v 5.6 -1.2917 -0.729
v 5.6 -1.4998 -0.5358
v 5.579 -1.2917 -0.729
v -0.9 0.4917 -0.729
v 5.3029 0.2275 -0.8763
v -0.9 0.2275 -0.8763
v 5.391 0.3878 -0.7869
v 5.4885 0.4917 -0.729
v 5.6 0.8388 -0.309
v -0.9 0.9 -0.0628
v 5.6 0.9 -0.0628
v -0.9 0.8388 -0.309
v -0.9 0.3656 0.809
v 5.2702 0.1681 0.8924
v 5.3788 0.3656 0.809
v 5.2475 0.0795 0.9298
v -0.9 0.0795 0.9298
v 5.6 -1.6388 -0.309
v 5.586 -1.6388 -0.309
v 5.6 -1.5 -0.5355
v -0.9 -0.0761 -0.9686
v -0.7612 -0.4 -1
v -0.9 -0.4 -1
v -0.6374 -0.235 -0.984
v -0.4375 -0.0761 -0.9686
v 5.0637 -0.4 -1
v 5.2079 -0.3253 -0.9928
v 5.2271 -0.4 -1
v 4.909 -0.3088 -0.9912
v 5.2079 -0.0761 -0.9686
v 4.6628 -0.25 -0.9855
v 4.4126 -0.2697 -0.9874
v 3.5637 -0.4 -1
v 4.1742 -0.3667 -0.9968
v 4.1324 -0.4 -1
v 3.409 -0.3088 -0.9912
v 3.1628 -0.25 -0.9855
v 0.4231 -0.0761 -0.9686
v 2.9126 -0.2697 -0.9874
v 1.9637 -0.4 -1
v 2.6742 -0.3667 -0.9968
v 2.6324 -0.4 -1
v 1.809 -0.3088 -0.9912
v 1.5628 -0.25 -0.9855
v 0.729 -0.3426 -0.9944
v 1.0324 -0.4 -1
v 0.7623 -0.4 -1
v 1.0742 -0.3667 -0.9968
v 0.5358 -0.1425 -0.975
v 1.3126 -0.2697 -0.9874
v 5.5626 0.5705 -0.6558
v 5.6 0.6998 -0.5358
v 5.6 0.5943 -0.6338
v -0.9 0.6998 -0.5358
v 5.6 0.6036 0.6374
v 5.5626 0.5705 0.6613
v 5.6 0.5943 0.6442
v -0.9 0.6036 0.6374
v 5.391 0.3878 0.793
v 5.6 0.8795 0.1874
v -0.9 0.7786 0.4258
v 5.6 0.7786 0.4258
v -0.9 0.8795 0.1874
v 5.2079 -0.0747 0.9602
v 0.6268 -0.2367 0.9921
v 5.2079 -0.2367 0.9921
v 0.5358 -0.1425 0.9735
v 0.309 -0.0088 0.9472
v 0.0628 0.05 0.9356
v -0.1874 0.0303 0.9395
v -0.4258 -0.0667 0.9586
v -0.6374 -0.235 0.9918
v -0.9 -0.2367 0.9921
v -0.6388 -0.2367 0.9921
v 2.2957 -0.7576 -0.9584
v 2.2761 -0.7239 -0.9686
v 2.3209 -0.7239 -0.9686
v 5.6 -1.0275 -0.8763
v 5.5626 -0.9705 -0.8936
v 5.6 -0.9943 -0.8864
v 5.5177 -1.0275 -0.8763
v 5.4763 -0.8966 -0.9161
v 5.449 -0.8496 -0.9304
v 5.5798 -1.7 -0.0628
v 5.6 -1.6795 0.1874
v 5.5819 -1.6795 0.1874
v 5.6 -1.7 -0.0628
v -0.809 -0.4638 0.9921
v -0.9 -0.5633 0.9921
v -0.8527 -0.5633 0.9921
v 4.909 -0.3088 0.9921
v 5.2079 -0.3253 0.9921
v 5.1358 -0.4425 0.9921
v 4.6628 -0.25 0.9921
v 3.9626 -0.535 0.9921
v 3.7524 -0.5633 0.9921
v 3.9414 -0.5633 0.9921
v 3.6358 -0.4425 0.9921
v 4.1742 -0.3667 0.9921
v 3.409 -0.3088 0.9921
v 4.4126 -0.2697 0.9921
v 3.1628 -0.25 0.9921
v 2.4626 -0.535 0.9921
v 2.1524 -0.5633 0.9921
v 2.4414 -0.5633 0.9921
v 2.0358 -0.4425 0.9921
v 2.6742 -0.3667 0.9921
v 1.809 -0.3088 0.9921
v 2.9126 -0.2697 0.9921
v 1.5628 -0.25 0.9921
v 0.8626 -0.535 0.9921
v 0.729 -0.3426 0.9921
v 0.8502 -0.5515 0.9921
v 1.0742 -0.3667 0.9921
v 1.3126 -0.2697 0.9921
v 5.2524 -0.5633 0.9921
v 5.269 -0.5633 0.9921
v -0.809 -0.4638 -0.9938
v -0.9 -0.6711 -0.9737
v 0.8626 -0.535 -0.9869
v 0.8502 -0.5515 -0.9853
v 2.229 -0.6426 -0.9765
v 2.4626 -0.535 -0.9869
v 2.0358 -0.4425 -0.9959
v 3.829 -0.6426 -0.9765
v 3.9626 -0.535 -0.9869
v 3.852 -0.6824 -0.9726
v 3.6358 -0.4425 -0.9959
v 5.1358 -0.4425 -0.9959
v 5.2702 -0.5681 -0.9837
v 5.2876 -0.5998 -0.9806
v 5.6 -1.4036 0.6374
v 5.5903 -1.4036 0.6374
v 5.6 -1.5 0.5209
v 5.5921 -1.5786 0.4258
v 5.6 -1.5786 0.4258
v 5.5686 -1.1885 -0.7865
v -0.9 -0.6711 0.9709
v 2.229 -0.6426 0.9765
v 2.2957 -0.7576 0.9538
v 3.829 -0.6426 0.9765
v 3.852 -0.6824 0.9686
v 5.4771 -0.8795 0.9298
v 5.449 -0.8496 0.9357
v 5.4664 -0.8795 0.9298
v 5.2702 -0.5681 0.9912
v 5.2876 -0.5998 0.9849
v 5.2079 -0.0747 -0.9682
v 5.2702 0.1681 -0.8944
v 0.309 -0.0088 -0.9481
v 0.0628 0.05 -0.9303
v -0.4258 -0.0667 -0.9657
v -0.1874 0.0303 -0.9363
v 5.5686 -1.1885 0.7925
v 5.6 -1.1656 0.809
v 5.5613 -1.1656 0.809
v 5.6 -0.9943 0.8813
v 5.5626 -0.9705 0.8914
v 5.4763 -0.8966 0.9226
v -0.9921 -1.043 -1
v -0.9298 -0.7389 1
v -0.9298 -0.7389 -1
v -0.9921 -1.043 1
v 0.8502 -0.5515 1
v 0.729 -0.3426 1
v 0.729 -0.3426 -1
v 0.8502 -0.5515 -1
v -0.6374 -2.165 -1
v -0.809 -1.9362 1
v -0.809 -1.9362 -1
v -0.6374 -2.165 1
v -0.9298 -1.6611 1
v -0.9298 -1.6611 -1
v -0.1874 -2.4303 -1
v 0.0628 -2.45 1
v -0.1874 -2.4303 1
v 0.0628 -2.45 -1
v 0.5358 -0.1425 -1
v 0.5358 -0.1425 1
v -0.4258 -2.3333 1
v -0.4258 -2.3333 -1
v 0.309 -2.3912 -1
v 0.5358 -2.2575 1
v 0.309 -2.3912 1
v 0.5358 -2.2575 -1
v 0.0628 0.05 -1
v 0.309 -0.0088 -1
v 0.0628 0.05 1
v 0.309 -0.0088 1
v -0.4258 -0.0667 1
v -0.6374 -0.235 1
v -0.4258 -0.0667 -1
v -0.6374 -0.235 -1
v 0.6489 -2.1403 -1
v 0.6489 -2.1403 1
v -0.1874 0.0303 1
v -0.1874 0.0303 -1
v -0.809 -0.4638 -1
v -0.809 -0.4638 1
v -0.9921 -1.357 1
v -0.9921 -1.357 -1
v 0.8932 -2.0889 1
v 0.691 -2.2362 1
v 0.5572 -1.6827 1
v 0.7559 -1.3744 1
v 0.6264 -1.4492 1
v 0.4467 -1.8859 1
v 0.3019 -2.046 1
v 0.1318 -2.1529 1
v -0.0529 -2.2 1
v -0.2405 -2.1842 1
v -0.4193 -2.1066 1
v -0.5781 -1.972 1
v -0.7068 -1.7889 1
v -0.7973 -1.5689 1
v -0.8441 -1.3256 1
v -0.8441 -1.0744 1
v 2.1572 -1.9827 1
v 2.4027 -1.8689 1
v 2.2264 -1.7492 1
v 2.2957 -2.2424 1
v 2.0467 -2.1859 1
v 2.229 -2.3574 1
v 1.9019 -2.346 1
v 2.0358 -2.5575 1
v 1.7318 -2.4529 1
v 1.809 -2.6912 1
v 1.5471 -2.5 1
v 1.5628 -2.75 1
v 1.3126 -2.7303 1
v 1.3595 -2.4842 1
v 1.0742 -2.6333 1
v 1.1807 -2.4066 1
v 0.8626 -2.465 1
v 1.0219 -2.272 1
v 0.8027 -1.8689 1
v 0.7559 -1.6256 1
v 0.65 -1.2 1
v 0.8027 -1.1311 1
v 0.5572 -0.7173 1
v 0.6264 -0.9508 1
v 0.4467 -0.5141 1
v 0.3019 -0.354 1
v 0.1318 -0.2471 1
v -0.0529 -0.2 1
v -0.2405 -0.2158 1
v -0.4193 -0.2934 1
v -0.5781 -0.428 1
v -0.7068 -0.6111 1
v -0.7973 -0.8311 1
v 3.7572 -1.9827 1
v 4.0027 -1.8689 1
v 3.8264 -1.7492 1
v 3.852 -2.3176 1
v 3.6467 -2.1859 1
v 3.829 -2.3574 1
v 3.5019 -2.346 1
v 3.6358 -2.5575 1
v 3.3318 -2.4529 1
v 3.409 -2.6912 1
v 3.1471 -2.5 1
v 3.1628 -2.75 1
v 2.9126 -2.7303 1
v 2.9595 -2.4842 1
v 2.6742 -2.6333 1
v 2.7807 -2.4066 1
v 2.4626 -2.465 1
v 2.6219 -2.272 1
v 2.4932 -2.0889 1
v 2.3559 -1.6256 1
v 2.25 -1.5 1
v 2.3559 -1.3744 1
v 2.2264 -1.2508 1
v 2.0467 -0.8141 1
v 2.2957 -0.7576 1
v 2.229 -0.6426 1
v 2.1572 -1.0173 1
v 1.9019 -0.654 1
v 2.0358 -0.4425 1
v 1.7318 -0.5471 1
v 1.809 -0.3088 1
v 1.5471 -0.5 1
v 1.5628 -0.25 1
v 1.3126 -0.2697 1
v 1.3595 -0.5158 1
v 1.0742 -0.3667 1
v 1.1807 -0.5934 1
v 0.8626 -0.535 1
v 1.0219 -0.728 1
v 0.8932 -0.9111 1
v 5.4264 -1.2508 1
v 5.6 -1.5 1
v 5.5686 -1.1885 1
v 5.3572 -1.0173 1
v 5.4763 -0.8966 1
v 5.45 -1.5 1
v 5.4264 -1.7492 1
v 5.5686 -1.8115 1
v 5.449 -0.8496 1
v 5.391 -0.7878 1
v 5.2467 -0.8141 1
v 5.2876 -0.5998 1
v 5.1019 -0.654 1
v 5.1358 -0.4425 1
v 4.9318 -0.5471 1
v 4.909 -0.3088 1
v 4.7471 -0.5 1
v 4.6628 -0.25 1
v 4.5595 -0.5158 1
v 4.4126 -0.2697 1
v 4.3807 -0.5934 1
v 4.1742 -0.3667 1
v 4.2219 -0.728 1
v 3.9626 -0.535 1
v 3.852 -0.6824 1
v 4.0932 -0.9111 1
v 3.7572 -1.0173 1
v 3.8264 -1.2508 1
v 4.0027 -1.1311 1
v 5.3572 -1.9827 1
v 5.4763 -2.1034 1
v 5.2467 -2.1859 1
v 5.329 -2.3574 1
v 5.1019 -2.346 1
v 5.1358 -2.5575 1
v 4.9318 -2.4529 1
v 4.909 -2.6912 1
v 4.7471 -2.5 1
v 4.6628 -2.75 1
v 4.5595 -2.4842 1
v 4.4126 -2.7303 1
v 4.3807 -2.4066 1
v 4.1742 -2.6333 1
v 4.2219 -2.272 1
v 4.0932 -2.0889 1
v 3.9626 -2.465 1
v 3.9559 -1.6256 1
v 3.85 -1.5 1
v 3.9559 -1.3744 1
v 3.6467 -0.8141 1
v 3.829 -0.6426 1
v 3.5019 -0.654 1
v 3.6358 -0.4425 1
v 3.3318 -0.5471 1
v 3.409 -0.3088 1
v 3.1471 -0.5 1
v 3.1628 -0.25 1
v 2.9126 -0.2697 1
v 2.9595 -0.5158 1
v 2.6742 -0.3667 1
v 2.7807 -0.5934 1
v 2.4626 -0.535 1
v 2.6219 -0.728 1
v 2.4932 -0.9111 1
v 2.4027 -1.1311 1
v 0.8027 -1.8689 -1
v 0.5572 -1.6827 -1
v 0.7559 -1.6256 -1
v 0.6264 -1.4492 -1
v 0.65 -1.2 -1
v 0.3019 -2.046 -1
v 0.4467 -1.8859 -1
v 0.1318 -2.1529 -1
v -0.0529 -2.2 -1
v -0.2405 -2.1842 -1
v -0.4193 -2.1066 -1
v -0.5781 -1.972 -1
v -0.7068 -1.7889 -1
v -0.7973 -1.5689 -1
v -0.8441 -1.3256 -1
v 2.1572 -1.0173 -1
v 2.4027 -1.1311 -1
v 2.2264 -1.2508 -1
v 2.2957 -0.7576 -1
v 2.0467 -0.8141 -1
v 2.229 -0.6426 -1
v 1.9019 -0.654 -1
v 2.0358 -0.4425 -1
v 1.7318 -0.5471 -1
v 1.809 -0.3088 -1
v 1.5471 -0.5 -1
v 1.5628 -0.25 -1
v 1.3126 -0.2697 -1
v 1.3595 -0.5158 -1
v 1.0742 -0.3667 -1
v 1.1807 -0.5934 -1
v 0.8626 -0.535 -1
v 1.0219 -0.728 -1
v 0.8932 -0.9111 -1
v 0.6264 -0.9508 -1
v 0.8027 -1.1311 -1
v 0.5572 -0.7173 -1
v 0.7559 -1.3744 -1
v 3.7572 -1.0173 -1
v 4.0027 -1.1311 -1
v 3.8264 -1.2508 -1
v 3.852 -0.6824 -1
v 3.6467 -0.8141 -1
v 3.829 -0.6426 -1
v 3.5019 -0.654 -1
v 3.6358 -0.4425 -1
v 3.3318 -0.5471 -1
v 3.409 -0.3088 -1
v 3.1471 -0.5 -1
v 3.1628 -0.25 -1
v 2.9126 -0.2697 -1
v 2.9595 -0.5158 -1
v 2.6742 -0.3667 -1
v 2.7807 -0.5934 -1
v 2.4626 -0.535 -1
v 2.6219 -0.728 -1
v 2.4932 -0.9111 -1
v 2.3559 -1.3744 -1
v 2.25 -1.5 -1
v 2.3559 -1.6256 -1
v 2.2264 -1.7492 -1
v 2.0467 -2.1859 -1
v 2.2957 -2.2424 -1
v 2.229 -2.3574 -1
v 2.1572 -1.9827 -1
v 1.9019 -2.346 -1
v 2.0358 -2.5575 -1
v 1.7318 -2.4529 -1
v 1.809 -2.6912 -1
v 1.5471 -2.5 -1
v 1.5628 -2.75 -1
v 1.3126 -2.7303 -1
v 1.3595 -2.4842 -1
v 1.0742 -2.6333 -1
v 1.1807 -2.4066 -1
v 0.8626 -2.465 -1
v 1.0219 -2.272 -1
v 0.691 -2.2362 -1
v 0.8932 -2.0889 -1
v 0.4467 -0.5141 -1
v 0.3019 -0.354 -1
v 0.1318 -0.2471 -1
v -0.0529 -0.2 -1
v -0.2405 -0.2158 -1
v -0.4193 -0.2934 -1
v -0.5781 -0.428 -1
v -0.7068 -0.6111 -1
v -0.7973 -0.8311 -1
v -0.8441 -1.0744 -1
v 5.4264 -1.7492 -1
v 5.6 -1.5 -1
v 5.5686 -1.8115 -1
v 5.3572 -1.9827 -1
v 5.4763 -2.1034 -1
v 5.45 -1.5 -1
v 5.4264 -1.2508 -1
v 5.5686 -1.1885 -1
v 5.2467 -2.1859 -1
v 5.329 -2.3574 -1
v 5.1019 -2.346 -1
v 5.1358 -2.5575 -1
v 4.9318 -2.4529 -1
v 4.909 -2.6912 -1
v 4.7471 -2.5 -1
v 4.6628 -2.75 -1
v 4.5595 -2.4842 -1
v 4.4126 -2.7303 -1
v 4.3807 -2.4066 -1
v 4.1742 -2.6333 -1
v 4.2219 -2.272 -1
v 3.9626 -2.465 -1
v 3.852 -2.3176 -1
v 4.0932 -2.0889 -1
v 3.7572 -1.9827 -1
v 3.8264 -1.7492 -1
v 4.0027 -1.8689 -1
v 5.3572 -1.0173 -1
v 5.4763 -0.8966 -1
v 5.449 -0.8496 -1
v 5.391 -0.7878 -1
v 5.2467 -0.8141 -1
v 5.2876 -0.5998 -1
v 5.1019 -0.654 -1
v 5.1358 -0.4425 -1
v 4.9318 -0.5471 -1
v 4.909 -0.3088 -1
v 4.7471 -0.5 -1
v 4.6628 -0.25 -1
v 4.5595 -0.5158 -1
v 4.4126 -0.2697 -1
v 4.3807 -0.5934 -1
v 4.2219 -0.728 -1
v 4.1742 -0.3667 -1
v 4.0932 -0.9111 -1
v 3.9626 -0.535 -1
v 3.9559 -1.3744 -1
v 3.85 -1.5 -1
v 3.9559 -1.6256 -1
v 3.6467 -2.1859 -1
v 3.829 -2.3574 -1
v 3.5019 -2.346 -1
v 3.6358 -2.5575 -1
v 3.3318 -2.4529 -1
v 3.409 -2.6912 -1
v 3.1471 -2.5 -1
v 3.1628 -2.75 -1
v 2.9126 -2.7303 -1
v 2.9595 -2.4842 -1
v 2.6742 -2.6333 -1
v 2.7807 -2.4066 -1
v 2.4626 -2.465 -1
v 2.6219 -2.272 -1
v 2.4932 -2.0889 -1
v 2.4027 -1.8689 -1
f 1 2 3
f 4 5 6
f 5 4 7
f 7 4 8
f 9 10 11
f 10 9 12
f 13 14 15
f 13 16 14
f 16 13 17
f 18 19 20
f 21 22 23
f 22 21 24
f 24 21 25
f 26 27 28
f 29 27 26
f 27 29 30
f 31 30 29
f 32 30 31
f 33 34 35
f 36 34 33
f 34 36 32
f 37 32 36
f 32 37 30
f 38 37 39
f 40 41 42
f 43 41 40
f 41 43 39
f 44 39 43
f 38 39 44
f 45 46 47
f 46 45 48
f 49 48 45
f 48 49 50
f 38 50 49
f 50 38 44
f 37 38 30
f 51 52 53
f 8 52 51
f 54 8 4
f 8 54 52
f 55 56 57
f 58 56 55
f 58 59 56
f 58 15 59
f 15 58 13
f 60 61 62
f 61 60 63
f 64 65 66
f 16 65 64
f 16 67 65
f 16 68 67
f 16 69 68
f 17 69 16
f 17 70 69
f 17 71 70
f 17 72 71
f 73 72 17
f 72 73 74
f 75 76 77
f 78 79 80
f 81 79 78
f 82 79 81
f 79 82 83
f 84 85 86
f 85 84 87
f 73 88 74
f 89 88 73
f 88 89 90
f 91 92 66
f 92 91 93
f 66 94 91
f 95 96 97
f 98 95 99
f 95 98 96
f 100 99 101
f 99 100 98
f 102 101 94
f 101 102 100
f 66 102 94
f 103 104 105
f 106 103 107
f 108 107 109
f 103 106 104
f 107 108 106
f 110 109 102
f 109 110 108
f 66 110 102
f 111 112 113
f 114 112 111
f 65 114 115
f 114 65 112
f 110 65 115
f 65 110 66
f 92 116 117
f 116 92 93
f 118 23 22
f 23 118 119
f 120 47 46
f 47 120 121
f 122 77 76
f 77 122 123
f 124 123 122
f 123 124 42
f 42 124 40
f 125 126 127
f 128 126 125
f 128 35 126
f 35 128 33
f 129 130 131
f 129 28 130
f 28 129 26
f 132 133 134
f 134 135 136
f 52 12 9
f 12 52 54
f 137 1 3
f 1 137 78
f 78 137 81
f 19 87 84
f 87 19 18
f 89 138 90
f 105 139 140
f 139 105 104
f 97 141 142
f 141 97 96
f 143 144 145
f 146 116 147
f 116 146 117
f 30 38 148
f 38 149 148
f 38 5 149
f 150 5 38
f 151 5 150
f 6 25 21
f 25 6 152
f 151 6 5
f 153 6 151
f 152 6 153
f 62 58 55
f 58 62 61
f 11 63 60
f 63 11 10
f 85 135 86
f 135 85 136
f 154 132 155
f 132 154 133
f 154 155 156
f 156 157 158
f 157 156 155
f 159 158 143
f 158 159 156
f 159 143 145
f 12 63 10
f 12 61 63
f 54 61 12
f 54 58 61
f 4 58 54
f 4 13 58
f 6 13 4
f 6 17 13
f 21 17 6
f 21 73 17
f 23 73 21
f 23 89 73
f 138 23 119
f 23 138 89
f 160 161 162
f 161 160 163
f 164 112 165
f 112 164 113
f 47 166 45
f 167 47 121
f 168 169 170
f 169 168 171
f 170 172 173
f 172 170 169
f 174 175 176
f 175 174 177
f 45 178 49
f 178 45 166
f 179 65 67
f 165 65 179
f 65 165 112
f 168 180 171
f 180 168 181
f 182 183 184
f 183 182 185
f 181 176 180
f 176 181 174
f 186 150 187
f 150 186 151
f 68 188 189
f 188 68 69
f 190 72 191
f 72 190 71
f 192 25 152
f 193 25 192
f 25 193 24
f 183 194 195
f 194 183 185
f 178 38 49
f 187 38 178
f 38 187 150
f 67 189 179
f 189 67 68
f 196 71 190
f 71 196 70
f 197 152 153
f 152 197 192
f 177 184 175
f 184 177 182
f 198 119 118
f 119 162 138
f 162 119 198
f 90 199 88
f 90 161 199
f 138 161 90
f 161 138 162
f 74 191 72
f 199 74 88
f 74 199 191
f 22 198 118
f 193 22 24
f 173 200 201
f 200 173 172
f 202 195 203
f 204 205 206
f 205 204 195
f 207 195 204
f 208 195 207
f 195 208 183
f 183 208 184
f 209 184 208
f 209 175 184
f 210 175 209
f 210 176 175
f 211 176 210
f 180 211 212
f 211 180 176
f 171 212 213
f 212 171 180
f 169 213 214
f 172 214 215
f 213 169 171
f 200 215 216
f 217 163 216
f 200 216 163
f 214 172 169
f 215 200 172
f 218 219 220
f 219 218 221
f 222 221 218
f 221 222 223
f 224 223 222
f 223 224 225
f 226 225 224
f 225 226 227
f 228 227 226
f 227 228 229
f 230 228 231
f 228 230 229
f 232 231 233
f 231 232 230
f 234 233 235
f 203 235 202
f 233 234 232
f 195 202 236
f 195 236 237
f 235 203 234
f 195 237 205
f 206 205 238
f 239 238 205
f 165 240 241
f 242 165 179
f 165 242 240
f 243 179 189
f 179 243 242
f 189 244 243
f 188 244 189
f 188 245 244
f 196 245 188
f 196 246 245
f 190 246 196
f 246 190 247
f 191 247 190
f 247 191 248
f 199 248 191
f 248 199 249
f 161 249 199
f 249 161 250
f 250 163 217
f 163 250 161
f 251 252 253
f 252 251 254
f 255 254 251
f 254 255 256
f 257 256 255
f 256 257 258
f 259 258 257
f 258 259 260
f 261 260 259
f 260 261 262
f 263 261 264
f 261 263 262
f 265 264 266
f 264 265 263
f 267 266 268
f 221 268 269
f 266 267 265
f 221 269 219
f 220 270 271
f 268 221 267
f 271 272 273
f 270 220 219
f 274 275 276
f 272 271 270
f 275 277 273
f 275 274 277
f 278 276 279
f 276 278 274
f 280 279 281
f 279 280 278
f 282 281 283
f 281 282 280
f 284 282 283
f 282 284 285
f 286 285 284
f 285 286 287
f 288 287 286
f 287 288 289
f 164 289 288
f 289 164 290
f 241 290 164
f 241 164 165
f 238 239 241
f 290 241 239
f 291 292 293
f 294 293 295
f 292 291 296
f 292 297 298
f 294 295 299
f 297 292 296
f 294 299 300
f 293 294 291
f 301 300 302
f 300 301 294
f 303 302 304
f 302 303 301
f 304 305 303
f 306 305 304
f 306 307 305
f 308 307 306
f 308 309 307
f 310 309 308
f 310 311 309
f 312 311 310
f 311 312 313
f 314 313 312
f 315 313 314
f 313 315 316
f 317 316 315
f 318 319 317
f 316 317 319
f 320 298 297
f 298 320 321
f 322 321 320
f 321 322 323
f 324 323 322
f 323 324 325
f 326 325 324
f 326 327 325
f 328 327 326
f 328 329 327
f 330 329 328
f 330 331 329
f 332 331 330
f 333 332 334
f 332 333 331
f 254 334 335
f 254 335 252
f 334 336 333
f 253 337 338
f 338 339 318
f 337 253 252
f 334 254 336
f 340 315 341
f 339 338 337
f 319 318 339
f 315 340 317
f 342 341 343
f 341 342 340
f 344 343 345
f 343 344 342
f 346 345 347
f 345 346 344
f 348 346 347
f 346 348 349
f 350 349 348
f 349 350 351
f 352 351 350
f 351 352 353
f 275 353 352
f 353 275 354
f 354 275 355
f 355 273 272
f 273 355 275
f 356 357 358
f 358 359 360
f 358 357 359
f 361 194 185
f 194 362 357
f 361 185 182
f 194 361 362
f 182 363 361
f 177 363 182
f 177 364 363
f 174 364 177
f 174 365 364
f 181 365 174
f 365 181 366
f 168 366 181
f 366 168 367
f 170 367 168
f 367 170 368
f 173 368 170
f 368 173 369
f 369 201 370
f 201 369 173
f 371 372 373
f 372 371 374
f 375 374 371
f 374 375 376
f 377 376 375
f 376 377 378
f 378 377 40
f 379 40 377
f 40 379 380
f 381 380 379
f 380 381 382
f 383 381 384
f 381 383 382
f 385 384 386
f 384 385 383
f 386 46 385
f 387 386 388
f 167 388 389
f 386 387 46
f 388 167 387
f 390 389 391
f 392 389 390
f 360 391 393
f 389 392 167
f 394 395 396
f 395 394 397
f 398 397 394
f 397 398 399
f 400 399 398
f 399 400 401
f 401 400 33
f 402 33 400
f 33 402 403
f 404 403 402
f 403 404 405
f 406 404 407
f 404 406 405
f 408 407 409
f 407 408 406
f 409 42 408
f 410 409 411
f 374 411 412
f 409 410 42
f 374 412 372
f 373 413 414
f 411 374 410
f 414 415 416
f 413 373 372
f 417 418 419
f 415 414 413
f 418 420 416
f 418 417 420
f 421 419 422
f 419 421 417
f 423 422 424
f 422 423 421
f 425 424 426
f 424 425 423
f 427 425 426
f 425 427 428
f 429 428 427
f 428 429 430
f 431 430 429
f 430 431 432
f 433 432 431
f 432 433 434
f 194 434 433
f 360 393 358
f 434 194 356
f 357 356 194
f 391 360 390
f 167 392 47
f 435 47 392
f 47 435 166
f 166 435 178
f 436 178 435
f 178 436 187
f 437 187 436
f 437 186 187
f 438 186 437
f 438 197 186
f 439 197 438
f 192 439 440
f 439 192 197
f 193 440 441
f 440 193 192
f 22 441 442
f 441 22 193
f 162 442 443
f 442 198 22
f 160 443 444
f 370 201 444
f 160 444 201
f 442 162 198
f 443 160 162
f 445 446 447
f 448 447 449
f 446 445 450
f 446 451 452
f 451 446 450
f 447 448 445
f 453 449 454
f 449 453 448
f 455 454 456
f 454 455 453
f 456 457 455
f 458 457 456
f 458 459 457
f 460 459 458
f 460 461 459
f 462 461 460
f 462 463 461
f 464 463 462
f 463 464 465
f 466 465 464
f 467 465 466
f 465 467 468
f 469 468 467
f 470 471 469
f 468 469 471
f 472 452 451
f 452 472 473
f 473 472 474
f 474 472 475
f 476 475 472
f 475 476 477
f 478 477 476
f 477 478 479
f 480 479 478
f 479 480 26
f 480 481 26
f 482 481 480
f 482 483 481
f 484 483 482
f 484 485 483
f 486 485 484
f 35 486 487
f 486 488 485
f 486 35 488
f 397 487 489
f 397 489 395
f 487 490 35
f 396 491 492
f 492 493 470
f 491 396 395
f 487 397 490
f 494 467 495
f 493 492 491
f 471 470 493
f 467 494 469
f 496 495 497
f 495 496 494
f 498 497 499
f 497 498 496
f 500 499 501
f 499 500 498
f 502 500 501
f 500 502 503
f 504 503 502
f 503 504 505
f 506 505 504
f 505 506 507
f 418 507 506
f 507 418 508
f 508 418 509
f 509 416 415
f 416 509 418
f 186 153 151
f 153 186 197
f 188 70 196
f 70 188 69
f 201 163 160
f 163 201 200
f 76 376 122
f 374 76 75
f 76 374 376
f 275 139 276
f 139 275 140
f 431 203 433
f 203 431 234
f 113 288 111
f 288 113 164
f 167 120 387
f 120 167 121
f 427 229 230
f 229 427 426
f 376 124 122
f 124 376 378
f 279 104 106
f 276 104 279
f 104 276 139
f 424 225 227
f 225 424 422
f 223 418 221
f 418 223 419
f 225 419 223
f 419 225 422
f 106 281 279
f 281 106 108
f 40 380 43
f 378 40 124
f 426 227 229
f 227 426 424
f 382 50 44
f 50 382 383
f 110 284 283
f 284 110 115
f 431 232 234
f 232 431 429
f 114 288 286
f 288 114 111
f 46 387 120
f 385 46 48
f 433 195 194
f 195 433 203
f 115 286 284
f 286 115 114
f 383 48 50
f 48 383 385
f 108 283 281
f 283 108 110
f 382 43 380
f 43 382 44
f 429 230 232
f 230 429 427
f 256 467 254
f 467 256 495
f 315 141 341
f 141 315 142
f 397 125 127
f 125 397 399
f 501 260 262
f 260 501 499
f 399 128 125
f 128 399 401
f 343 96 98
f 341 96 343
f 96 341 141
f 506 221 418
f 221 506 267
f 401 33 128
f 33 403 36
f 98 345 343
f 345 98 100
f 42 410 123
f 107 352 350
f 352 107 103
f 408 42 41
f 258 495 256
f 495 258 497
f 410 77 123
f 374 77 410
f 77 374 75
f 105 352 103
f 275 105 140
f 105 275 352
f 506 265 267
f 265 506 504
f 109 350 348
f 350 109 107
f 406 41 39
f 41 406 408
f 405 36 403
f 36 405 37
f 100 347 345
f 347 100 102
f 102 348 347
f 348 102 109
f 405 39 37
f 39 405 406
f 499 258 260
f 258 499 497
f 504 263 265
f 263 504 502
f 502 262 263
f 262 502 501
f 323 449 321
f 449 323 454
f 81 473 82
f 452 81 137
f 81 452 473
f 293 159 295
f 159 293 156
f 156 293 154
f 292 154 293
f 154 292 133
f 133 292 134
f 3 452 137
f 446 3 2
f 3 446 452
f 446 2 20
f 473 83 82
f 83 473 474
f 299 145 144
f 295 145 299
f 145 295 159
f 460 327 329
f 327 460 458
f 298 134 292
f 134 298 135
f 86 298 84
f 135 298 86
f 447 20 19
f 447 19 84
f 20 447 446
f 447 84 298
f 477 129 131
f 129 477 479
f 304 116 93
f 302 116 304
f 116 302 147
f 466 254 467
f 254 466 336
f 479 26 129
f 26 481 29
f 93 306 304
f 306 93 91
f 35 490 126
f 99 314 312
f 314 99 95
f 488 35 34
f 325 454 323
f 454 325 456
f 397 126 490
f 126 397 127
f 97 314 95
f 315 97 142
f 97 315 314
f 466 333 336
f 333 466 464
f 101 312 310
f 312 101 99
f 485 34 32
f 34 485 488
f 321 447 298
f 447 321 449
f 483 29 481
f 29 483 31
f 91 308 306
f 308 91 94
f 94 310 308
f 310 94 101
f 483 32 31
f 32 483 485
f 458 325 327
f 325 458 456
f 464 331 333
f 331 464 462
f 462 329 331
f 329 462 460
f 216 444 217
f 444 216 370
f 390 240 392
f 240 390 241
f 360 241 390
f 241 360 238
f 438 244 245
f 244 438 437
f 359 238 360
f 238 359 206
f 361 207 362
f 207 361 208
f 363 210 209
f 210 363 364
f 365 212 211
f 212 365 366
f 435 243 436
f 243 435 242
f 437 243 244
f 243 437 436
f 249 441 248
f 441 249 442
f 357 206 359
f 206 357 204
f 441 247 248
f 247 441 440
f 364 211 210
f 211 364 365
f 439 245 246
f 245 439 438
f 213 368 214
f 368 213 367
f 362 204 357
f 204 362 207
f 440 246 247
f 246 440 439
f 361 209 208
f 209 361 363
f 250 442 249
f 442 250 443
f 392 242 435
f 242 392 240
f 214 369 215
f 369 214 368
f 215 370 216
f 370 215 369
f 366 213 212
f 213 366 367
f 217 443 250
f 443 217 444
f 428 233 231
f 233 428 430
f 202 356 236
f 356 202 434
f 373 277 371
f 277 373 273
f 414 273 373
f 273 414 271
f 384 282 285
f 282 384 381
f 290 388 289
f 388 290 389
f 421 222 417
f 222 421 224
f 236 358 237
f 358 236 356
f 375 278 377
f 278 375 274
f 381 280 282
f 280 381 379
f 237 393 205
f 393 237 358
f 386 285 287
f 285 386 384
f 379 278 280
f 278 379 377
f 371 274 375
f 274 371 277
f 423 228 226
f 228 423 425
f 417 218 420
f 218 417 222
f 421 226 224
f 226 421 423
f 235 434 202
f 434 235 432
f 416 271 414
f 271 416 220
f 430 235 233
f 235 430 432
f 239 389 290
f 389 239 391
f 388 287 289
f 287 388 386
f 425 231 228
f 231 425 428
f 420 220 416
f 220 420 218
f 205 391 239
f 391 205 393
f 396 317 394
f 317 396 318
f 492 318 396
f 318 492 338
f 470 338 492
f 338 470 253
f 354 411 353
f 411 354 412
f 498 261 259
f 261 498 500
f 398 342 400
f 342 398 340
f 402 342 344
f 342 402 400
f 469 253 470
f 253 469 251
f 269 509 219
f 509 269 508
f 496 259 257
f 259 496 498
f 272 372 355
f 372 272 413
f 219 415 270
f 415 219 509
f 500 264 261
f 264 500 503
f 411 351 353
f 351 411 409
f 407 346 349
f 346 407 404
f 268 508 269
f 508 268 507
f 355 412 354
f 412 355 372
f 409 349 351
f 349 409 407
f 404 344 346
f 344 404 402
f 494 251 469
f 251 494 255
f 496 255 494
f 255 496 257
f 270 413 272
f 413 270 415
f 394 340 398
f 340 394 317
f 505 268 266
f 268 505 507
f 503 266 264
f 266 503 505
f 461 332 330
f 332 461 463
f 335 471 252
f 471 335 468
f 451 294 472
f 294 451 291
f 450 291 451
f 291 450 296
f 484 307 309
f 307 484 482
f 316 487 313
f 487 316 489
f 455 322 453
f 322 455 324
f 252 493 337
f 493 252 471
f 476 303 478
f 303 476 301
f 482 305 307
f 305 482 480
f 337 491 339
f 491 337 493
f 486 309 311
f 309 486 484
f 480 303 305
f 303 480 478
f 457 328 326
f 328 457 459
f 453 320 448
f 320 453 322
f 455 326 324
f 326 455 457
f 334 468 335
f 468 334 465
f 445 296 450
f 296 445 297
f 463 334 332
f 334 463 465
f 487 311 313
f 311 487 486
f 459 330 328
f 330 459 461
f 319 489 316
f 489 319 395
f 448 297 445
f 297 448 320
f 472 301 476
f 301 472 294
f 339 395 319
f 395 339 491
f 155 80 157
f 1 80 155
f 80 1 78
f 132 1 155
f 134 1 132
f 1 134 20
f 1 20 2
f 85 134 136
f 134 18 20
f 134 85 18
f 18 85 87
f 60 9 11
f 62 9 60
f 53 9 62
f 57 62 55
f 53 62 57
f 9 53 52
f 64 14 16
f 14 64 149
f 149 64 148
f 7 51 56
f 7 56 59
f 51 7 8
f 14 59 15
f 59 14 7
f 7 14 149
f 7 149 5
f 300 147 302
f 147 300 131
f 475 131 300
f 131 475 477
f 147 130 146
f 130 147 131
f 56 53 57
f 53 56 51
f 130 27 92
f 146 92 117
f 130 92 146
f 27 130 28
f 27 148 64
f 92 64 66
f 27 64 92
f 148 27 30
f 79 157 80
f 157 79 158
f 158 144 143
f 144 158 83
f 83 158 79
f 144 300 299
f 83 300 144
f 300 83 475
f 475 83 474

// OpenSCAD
difference(){
    union(){
        // spine of handle
        translate([-0.9,-0.4,0]){
            resize([0,2.6,0]){
                rotate([0,90,0]){
                    cylinder(r=1,h=7,$fn=25);
                }
            }
        }
        
        // finger guard shell
        translate([0,-1.2,-1]){
            resize([0,2.5,0]){
                difference(){
                    cylinder(r=1,h=2,$fn=25);
                }
            }
        }
        translate([1.5,-1.5,-1]){
            resize([0,2.5,0]){
                difference(){
                    cylinder(r=1,h=2,$fn=25);
                }
            }
        }
        translate([3.1,-1.5,-1]){
            resize([0,2.5,0]){
                difference(){
                    cylinder(r=1,h=2,$fn=25);
                }
            }
        }
        translate([4.6,-1.5,-1]){
            resize([0,2.5,0]){
                difference(){
                    cylinder(r=1,h=2,$fn=25);
                }
            }
        }
    }
    
    // finger guard holes
    translate([-0.1,-1.2,-2]){
        resize([0,2,0]){
            cylinder(r=.75,h=4,$fn=25);
        }
    }
    translate([1.5,-1.5,-2]){
        resize([0,2,0]){
            cylinder(r=.75,h=4,$fn=25);
        }
    }
    translate([3.1,-1.5,-2]){
        resize([0,2,0]){
            cylinder(r=.75,h=4,$fn=25);
        }
    }
    translate([4.7,-1.5,-2]){
        resize([0,2,0]){
        cylinder(r=.75,h=4,$fn=25);
        }
    }
    
    // blade cut-out
    translate([5.6,-3,-2]){
        #cube([5,4,4]);
    }
    translate([6.2,-0.2,-2]){
        cylinder(r=1,h=4,$fn=25);
    }
    /*
    // round finger guards
    translate([-2,-1,0]){
        #resize([0,7,4.5]){
            rotate([0,90,0]){
                difference(){
                    cylinder(r=1,h=10,$fn=25);
                    cylinder(r=.50,h=10,$fn=50);
                }
            }
        }
    }
    */
}
